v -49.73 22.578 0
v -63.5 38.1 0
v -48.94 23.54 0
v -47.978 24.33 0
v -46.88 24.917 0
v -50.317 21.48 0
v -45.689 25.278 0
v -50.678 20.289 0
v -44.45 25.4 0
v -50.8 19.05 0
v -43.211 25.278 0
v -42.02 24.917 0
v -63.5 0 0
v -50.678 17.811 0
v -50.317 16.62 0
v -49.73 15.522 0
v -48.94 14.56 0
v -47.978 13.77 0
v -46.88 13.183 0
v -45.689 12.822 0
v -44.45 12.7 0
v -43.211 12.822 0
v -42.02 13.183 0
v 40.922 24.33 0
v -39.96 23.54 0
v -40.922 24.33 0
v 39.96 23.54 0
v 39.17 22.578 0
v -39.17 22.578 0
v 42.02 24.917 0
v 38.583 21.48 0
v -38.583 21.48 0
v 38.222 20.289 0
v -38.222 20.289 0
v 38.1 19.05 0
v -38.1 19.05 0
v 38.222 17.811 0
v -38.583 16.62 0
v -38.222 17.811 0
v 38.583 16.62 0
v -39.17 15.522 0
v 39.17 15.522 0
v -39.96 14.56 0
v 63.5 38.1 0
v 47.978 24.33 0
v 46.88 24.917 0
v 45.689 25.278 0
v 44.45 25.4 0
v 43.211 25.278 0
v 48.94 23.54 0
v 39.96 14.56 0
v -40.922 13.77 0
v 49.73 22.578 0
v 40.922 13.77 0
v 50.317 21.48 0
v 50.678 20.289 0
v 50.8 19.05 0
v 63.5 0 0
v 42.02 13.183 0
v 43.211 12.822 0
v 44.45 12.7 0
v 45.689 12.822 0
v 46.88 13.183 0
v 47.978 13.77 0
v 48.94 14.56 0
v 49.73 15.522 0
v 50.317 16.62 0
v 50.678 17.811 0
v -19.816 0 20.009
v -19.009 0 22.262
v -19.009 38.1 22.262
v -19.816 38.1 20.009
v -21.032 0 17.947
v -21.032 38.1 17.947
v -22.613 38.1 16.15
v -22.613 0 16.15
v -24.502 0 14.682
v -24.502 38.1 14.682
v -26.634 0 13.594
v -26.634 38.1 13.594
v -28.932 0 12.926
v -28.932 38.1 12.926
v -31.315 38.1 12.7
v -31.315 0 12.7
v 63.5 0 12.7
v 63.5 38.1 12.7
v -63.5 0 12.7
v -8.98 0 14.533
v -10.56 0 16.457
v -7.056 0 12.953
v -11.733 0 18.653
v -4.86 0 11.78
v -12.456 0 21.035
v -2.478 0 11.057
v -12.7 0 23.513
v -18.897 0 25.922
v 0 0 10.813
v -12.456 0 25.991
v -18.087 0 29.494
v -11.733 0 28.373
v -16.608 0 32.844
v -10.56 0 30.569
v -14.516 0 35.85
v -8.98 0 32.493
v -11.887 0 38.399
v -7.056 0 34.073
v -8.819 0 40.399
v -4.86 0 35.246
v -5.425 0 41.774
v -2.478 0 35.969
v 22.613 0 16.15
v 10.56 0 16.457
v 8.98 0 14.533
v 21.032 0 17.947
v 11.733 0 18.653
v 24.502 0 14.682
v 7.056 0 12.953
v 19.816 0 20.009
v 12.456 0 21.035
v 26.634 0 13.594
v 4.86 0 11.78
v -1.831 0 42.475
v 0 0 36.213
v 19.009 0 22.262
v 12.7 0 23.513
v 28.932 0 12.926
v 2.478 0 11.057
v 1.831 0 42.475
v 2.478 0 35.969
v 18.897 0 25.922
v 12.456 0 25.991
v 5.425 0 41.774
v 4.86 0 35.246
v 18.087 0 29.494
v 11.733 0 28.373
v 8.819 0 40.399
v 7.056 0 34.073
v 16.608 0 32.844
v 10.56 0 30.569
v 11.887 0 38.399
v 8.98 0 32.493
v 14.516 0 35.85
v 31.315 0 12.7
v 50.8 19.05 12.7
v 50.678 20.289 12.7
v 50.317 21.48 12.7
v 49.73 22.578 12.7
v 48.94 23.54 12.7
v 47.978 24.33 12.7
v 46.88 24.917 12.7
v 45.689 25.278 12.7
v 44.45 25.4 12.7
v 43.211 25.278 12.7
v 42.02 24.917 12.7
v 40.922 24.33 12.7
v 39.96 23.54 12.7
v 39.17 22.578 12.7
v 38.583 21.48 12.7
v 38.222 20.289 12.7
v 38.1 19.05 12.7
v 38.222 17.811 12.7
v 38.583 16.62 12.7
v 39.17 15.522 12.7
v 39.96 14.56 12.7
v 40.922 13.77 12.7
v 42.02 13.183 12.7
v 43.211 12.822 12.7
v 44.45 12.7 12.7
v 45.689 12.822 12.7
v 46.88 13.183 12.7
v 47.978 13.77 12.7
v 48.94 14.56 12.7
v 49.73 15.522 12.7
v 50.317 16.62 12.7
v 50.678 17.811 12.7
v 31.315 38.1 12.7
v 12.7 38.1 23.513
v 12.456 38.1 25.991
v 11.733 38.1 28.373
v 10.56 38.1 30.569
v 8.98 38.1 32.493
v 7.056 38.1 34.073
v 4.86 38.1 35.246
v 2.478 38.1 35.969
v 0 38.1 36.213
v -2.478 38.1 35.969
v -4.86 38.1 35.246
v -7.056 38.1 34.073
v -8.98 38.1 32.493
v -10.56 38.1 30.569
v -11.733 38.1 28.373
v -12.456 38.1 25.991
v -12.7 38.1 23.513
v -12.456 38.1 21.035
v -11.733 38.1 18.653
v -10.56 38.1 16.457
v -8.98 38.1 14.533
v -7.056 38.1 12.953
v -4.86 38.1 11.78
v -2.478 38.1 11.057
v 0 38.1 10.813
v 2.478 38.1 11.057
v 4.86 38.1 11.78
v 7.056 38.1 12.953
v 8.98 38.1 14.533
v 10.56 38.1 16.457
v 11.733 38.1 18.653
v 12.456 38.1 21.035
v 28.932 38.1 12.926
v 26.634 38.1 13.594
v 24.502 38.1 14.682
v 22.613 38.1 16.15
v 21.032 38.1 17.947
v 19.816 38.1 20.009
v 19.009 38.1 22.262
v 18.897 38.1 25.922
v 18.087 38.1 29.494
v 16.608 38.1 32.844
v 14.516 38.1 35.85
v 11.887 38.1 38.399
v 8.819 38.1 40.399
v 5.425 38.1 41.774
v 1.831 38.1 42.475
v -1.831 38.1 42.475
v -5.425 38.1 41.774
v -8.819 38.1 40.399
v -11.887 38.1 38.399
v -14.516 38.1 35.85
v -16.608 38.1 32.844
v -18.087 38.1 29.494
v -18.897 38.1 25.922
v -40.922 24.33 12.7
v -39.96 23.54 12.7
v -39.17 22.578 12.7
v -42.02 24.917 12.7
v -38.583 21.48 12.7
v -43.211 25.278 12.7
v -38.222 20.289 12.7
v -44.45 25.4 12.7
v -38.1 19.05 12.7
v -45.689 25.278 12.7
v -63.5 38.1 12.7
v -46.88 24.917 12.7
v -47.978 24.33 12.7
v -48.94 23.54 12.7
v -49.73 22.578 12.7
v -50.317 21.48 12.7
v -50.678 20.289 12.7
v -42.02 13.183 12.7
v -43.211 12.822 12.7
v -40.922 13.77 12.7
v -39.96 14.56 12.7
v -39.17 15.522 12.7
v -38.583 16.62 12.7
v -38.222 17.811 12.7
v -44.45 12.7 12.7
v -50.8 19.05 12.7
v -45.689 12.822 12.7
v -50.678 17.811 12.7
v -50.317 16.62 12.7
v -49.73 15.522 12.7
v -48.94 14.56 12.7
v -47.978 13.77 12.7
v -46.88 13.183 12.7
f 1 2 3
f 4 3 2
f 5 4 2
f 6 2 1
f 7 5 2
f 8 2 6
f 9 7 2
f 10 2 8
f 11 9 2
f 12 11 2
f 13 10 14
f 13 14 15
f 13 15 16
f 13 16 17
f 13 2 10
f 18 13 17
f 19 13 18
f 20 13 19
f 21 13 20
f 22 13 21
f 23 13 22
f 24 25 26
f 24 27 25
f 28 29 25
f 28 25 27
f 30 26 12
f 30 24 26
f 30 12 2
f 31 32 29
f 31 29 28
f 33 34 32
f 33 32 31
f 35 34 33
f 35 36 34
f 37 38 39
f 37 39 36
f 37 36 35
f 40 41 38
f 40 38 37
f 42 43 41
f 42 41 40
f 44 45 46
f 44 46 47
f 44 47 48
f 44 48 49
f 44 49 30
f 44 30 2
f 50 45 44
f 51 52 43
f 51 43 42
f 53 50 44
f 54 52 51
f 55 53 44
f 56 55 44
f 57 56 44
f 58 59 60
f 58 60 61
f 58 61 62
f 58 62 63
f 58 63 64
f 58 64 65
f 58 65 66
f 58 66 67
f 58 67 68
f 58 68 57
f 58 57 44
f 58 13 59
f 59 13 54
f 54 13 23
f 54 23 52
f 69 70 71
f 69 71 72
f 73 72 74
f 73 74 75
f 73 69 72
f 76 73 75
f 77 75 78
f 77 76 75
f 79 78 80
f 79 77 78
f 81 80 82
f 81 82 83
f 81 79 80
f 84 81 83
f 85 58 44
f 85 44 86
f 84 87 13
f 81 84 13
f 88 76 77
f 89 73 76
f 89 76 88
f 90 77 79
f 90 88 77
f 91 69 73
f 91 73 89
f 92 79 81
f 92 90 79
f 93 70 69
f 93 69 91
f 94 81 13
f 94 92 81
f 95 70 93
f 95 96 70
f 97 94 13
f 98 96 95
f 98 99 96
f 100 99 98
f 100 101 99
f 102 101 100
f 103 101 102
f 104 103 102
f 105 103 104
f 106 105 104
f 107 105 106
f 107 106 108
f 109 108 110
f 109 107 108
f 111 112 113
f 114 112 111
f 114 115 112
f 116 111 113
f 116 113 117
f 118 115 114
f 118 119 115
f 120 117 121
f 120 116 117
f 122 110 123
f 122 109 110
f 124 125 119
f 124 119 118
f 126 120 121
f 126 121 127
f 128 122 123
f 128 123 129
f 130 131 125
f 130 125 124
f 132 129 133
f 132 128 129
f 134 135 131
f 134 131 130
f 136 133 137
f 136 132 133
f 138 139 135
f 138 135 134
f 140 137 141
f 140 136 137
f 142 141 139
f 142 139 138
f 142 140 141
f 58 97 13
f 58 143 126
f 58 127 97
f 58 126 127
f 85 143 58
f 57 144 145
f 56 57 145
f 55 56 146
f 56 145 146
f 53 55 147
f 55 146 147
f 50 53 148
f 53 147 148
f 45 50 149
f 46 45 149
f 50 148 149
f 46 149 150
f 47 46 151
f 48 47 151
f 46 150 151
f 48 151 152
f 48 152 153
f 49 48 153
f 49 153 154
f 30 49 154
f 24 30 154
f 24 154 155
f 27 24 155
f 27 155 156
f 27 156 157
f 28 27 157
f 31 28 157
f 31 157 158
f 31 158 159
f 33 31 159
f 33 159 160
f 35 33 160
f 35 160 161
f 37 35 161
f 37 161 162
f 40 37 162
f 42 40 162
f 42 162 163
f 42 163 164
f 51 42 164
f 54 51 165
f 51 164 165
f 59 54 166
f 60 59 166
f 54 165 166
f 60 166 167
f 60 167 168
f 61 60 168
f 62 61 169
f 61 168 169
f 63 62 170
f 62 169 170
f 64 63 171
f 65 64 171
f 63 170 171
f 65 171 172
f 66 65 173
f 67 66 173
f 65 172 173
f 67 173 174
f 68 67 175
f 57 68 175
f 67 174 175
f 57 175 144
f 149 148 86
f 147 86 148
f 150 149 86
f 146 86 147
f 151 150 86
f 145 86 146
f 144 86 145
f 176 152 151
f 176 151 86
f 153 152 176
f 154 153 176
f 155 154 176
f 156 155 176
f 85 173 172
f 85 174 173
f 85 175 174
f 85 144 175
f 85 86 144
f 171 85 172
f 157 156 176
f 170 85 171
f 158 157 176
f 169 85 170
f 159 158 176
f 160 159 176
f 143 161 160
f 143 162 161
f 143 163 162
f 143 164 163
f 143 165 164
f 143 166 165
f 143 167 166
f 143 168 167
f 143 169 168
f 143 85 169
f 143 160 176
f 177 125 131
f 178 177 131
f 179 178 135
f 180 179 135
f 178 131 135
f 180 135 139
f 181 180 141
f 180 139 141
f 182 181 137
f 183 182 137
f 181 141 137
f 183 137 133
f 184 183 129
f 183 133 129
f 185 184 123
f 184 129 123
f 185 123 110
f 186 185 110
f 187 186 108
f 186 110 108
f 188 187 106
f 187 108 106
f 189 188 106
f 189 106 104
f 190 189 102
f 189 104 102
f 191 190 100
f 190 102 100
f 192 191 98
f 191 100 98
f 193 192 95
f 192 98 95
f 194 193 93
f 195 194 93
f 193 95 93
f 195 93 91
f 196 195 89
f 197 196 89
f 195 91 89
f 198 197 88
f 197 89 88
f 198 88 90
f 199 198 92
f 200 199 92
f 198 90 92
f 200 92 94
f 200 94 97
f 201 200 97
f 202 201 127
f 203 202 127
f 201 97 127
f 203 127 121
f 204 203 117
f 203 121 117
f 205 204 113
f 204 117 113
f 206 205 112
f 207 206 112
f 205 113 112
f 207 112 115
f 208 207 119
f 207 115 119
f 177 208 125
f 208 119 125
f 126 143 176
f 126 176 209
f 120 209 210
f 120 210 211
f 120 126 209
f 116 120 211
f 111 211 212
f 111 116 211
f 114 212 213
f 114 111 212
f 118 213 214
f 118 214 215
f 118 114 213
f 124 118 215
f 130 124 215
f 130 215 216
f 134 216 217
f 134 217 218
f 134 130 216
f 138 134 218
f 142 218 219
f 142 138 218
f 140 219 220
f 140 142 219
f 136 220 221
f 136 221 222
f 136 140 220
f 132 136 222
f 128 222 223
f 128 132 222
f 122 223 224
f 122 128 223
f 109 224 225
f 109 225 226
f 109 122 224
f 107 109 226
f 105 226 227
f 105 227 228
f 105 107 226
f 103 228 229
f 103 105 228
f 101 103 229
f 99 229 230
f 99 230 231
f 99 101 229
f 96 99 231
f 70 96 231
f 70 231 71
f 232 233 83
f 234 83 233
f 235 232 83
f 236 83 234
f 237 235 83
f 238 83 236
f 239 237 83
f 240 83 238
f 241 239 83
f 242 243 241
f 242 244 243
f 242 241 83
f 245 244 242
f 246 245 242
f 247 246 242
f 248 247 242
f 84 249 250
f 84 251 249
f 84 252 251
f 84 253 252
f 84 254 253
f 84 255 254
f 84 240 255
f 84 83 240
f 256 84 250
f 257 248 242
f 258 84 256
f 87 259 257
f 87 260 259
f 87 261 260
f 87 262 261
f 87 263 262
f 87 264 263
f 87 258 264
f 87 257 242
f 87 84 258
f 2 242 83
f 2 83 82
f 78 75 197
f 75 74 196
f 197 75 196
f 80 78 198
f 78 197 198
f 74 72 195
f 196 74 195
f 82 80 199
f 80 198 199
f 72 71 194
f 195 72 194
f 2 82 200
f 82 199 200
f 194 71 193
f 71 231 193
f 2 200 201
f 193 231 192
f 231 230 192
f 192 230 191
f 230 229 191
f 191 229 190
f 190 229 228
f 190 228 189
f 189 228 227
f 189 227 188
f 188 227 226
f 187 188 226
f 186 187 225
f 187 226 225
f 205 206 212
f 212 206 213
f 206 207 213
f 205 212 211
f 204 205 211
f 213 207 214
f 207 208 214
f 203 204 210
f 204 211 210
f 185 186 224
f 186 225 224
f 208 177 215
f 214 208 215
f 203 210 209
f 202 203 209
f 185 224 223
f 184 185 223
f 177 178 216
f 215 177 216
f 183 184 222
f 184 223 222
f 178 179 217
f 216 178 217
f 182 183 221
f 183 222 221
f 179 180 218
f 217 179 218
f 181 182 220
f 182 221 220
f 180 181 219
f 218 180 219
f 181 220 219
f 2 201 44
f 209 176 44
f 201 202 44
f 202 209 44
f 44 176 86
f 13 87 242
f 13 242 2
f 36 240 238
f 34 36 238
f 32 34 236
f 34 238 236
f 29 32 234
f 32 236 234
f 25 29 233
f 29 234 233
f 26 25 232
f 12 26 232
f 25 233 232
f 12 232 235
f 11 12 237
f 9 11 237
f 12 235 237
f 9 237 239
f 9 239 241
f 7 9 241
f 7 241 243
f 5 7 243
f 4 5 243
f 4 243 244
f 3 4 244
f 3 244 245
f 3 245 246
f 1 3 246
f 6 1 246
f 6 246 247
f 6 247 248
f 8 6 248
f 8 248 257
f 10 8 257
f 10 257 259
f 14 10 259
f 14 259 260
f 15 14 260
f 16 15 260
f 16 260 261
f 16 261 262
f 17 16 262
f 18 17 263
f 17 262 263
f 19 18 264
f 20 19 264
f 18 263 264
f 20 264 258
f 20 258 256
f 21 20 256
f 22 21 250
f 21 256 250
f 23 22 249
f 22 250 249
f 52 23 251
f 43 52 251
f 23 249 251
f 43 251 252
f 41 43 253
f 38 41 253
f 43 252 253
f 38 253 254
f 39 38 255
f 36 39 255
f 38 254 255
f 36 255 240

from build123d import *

# Parameters (mm, degrees)
F0_R     = 12.7
F1_DEPTH = 38.1
F2_R     = 6.35
F3_DEPTH = 25.4


with BuildPart() as f1:
    # F0 (on Front) → F1 (new body)
    with BuildSketch(Plane.XZ):
        with BuildLine():
            Line((-63.5, 12.7), (-63.5, 0))
            Line((-63.5, 0), (63.5, 0))
            Line((63.5, 0), (63.5, 12.7))
            Line((63.5, 12.7), (31.315128, 12.7))
            ThreePointArc((31.315128, 12.7), (23.522863, 15.37151), (19.008884, 22.26211))
            ThreePointArc((19.008884, 22.26211), (0, 42.563047), (-19.008884, 22.26211))
            ThreePointArc((-19.008884, 22.26211), (-23.522863, 15.37151), (-31.315128, 12.7))
            Line((-31.315128, 12.7), (-63.5, 12.7))
        make_face()
        with Locations((0, 23.513047)):
            Circle(F0_R, mode=Mode.SUBTRACT)
    extrude(amount=-F1_DEPTH)

    # F2 (on face) → F3 (cut)
    with BuildSketch(Plane.XY.offset(12.7)):
        with Locations((-44.45, 19.05)):
            Circle(F2_R)
        with Locations((44.45, 19.05)):
            Circle(F2_R)
    extrude(amount=-F3_DEPTH, mode=Mode.SUBTRACT)


solid = f1.part
